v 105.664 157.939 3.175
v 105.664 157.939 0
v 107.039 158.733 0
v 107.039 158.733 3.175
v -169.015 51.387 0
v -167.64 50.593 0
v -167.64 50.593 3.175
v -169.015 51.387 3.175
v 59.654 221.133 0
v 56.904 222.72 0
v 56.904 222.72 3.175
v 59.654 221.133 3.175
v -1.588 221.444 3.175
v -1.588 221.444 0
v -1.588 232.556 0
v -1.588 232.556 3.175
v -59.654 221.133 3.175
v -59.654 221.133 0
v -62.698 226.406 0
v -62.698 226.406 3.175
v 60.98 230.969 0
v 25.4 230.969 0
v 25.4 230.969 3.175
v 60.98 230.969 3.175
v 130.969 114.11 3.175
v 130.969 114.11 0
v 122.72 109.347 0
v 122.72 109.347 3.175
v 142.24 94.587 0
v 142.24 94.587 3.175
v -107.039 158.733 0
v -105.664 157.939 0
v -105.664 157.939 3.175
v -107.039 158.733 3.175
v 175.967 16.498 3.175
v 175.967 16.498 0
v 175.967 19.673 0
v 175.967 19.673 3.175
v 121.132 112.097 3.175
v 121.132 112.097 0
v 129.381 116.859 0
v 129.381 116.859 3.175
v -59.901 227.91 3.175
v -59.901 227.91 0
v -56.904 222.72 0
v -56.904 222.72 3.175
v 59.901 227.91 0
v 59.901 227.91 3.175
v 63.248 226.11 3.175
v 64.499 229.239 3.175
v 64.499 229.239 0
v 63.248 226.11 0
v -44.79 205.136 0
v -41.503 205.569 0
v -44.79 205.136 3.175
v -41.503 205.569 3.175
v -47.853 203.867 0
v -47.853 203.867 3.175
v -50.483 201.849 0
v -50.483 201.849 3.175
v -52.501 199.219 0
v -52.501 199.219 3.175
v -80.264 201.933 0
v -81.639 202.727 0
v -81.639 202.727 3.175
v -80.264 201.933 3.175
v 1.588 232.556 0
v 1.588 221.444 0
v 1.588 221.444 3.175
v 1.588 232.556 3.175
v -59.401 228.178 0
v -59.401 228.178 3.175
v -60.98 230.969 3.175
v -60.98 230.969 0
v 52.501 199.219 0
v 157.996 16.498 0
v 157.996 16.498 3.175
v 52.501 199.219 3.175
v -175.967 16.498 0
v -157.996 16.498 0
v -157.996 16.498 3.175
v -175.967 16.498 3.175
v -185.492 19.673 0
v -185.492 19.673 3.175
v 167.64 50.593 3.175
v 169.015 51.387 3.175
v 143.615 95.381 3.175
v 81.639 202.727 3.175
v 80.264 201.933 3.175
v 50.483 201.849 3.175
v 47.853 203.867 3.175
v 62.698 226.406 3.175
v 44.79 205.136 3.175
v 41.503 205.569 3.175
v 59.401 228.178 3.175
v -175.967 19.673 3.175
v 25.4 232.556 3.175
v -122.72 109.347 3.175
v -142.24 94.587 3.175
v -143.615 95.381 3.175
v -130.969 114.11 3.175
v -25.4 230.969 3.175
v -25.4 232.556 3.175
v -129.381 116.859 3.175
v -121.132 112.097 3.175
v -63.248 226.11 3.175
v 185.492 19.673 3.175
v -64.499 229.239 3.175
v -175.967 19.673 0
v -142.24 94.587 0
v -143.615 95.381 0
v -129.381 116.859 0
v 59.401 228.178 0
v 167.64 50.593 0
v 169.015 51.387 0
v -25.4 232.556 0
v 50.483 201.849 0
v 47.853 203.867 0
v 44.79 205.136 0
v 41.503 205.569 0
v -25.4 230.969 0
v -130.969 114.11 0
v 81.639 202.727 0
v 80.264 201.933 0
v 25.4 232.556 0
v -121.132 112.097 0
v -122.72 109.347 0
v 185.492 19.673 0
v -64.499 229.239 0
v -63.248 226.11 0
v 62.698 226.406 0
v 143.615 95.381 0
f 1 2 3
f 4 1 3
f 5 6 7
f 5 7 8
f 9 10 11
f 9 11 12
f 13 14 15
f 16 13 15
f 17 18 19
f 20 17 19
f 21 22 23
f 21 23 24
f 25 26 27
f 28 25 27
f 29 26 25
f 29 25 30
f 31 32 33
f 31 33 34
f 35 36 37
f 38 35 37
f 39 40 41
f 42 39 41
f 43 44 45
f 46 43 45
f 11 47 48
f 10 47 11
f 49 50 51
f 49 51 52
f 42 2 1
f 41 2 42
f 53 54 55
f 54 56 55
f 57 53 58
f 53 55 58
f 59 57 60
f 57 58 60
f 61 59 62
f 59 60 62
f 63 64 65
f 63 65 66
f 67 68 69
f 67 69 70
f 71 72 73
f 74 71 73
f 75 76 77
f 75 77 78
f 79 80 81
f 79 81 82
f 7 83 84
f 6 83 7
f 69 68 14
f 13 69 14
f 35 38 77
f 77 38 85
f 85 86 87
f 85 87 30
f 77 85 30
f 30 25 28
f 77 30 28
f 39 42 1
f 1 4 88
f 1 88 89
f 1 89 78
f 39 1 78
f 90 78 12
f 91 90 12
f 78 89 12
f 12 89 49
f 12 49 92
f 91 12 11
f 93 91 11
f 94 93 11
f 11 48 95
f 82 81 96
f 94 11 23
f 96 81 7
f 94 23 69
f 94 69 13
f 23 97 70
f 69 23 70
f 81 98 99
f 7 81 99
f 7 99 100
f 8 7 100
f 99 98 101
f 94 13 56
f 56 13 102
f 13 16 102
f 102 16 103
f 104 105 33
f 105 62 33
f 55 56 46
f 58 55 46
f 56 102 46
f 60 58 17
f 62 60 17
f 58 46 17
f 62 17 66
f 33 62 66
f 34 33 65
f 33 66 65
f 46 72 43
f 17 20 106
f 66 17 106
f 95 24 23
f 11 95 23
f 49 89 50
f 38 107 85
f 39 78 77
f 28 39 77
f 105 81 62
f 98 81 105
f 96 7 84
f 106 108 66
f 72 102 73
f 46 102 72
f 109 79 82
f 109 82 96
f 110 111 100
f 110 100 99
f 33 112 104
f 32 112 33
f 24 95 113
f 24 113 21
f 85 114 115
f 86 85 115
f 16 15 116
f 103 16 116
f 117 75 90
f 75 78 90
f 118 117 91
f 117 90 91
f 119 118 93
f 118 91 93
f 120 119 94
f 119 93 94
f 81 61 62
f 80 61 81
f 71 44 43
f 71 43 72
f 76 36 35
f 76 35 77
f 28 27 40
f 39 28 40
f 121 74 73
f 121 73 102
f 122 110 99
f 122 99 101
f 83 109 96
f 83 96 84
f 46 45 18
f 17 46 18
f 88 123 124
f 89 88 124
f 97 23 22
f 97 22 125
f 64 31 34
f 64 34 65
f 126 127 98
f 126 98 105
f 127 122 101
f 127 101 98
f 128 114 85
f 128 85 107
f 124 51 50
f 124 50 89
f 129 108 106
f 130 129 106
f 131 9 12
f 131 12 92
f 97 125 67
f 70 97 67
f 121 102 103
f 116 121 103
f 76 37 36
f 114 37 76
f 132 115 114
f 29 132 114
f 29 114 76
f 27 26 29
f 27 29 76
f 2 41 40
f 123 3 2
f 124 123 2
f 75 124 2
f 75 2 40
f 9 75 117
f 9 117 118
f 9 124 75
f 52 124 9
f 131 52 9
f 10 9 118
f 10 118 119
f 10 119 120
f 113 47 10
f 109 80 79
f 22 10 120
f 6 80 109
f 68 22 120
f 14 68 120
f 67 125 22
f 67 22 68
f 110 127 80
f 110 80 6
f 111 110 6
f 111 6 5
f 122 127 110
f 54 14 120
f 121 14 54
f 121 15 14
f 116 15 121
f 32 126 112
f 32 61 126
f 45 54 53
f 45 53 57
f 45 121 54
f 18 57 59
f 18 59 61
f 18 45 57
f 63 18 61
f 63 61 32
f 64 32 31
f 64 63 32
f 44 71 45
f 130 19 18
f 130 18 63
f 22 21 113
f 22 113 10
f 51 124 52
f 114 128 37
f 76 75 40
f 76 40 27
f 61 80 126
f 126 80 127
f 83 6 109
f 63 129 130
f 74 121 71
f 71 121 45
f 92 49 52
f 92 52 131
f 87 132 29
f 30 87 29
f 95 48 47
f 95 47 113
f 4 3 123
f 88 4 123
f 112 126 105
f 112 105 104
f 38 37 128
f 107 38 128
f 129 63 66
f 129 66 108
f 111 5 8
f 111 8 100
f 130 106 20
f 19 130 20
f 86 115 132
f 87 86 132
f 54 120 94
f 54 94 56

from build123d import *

# Parameters (mm, degrees)
BOSS_EXTRUDE1_DEPTH = 3.175
FILLET1_R           = 12.7
SKETCH3_W           = 50.8
SKETCH3_H           = 1.5875
BOSS_EXTRUDE2_DEPTH = 3.175
CUT_EXTRUDE1_DEPTH  = 305.700701144
CUT_EXTRUDE2_DEPTH  = 305.700701144
CUT_EXTRUDE3_REACH  = 306.045
SKETCH6_W           = 3.175
SKETCH6_H           = 11.1125
CUT_EXTRUDE5_START  = -3.175
CUT_EXTRUDE5_DEPTH  = 3.175
SKETCH8_W           = 471.002245988
SKETCH8_H           = 22.673608405
CUT_EXTRUDE6_DEPTH  = 305.045309672


with BuildPart() as part:
    # Sketch1 → Boss-Extrude1 (new body)
    with BuildSketch(Plane.XY):
        Polygon((-196.85, 0), (-63.5, 230.968975189), (63.5, 230.968975189), (196.85, 0), (167.520606325, 0), (48.835303163, 205.568975189), (-48.835303163, 205.568975189), (-167.520606325, 0), align=None)
    extrude(amount=BOSS_EXTRUDE1_DEPTH)

    # Fillet1
    fillet1_edges = [part.edges().sort_by_distance(p)[0] for p in [
        (167.520606325, 0, 1.5875),
        (48.835303163, 205.568975189, 1.5875),
        (-48.835303163, 205.568975189, 1.5875),
        (-167.520606325, 0, 1.5875),
    ]]
    fillet(fillet1_edges, radius=FILLET1_R)

    # Sketch3 → Boss-Extrude2 (add)
    with BuildSketch(Plane(origin=(0, 0, 0), x_dir=(-1, 0, 0), z_dir=(0, 0, -1))):
        Polygon((81.638815329, 202.726625451), (80.264, 201.932875451), (105.664, 157.938784939), (107.038815329, 158.732534939), align=None)
        Polygon((143.614815329, 95.381044601), (142.24, 94.587294601), (167.64, 50.593204089), (169.014815329, 51.386954089), align=None)
        with Locations((0, 231.762725189)):
            Rectangle(SKETCH3_W, SKETCH3_H)
    boss_extrude2 = extrude(amount=-BOSS_EXTRUDE2_DEPTH)

    # Sketch5 → Cut-Extrude1 (cut, through all)
    with BuildSketch(Plane(origin=(0, 0, 0), x_dir=(-1, 0, 0), z_dir=(0, 0, -1))):
        Polygon((-175.966912895, 19.672783942), (-185.491912895, 19.672783942), (-187.325, 16.497783942), (-186.309, 16.497783942), (-175.966912895, 16.497783942), align=None)
        Polygon((-186.309, 16.497783942), (-187.325, 16.497783942), (-196.85, 0), (-195.834, 0), align=None)
        Polygon((-121.132358029, 112.096802923), (-129.38125, 116.859302923), (-130.96875, 114.109672266), (-122.719858029, 109.347172266), align=None)
    cut_extrude1 = extrude(amount=-CUT_EXTRUDE1_DEPTH, mode=Mode.SUBTRACT)

    # Sketch4 → Cut-Extrude2 (cut, through all)
    with BuildSketch(Plane(origin=(0, 0, 0), x_dir=(-1, 0, 0), z_dir=(0, 0, -1))):
        Polygon((-61.666912895, 230.968975189), (-56.904412895, 222.720083218), (-59.654043552, 221.132583218), (-64.416543552, 229.381475189), (-63.5, 230.968975189), align=None)
    cut_extrude2 = extrude(amount=-CUT_EXTRUDE2_DEPTH, mode=Mode.SUBTRACT)

    # Mirror1: Boss-Extrude2, Cut-Extrude1, Cut-Extrude2 across plane
    add(boss_extrude2.mirror(Plane(origin=(0, 0, 0), x_dir=(0, 0, 1), z_dir=(1, 0, 0))))
    add(cut_extrude1.mirror(Plane(origin=(0, 0, 0), x_dir=(0, 0, 1), z_dir=(1, 0, 0))), mode=Mode.SUBTRACT)
    add(cut_extrude2.mirror(Plane(origin=(0, 0, 0), x_dir=(0, 0, 1), z_dir=(1, 0, 0))), mode=Mode.SUBTRACT)

    # Sketch6 → Cut-Extrude3 (cut, up to next)
    with BuildSketch(Plane(origin=(0, 0, 0), x_dir=(-1, 0, 0), z_dir=(0, 0, -1)), mode=Mode.PRIVATE) as cut_extrude3_sk1:
        with Locations((0, 227.000225189)):
            Rectangle(SKETCH6_W, SKETCH6_H)
    cut_extrude3_tool1 = extrude(cut_extrude3_sk1.sketch, amount=-CUT_EXTRUDE3_REACH, mode=Mode.PRIVATE) & part.part
    add(cut_extrude3_tool1.solids().sort_by_distance((0, 227.000225, 0))[0], mode=Mode.SUBTRACT)

    # Sketch7 → Cut-Extrude5 (cut)
    with BuildSketch(Plane(origin=(0, 0, 0), x_dir=(-1, 0, 0), z_dir=(0, 0, -1)).offset(CUT_EXTRUDE5_START)):
        Polygon((-61.666912895, 230.968975189), (-64.416543552, 229.381475189), (-62.698387042, 226.405540819), (-59.400779492, 228.178478093), (-60.980004947, 230.968975189), align=None)
        Polygon((-64.416543552, 229.381475189), (-64.498587563, 229.239370794), (-63.247784195, 226.110161009), (-62.698387042, 226.405540819), align=None)
        Polygon((64.498587563, 229.239370794), (63.247784195, 226.110161009), (59.400779492, 228.178478093), (60.980004947, 230.968975189), (61.666912895, 230.968975189), (64.416543552, 229.381475189), align=None)
    extrude(amount=CUT_EXTRUDE5_DEPTH, mode=Mode.SUBTRACT)

    # Sketch8 → Cut-Extrude6 (cut, through all)
    with BuildSketch(Plane(origin=(0, 0, 0), x_dir=(-1, 0, 0), z_dir=(0, 0, -1))):
        with Locations((-11.378610212, 5.16097974)):
            Rectangle(SKETCH8_W, SKETCH8_H)
    extrude(amount=-CUT_EXTRUDE6_DEPTH, mode=Mode.SUBTRACT)


solid = part.part
